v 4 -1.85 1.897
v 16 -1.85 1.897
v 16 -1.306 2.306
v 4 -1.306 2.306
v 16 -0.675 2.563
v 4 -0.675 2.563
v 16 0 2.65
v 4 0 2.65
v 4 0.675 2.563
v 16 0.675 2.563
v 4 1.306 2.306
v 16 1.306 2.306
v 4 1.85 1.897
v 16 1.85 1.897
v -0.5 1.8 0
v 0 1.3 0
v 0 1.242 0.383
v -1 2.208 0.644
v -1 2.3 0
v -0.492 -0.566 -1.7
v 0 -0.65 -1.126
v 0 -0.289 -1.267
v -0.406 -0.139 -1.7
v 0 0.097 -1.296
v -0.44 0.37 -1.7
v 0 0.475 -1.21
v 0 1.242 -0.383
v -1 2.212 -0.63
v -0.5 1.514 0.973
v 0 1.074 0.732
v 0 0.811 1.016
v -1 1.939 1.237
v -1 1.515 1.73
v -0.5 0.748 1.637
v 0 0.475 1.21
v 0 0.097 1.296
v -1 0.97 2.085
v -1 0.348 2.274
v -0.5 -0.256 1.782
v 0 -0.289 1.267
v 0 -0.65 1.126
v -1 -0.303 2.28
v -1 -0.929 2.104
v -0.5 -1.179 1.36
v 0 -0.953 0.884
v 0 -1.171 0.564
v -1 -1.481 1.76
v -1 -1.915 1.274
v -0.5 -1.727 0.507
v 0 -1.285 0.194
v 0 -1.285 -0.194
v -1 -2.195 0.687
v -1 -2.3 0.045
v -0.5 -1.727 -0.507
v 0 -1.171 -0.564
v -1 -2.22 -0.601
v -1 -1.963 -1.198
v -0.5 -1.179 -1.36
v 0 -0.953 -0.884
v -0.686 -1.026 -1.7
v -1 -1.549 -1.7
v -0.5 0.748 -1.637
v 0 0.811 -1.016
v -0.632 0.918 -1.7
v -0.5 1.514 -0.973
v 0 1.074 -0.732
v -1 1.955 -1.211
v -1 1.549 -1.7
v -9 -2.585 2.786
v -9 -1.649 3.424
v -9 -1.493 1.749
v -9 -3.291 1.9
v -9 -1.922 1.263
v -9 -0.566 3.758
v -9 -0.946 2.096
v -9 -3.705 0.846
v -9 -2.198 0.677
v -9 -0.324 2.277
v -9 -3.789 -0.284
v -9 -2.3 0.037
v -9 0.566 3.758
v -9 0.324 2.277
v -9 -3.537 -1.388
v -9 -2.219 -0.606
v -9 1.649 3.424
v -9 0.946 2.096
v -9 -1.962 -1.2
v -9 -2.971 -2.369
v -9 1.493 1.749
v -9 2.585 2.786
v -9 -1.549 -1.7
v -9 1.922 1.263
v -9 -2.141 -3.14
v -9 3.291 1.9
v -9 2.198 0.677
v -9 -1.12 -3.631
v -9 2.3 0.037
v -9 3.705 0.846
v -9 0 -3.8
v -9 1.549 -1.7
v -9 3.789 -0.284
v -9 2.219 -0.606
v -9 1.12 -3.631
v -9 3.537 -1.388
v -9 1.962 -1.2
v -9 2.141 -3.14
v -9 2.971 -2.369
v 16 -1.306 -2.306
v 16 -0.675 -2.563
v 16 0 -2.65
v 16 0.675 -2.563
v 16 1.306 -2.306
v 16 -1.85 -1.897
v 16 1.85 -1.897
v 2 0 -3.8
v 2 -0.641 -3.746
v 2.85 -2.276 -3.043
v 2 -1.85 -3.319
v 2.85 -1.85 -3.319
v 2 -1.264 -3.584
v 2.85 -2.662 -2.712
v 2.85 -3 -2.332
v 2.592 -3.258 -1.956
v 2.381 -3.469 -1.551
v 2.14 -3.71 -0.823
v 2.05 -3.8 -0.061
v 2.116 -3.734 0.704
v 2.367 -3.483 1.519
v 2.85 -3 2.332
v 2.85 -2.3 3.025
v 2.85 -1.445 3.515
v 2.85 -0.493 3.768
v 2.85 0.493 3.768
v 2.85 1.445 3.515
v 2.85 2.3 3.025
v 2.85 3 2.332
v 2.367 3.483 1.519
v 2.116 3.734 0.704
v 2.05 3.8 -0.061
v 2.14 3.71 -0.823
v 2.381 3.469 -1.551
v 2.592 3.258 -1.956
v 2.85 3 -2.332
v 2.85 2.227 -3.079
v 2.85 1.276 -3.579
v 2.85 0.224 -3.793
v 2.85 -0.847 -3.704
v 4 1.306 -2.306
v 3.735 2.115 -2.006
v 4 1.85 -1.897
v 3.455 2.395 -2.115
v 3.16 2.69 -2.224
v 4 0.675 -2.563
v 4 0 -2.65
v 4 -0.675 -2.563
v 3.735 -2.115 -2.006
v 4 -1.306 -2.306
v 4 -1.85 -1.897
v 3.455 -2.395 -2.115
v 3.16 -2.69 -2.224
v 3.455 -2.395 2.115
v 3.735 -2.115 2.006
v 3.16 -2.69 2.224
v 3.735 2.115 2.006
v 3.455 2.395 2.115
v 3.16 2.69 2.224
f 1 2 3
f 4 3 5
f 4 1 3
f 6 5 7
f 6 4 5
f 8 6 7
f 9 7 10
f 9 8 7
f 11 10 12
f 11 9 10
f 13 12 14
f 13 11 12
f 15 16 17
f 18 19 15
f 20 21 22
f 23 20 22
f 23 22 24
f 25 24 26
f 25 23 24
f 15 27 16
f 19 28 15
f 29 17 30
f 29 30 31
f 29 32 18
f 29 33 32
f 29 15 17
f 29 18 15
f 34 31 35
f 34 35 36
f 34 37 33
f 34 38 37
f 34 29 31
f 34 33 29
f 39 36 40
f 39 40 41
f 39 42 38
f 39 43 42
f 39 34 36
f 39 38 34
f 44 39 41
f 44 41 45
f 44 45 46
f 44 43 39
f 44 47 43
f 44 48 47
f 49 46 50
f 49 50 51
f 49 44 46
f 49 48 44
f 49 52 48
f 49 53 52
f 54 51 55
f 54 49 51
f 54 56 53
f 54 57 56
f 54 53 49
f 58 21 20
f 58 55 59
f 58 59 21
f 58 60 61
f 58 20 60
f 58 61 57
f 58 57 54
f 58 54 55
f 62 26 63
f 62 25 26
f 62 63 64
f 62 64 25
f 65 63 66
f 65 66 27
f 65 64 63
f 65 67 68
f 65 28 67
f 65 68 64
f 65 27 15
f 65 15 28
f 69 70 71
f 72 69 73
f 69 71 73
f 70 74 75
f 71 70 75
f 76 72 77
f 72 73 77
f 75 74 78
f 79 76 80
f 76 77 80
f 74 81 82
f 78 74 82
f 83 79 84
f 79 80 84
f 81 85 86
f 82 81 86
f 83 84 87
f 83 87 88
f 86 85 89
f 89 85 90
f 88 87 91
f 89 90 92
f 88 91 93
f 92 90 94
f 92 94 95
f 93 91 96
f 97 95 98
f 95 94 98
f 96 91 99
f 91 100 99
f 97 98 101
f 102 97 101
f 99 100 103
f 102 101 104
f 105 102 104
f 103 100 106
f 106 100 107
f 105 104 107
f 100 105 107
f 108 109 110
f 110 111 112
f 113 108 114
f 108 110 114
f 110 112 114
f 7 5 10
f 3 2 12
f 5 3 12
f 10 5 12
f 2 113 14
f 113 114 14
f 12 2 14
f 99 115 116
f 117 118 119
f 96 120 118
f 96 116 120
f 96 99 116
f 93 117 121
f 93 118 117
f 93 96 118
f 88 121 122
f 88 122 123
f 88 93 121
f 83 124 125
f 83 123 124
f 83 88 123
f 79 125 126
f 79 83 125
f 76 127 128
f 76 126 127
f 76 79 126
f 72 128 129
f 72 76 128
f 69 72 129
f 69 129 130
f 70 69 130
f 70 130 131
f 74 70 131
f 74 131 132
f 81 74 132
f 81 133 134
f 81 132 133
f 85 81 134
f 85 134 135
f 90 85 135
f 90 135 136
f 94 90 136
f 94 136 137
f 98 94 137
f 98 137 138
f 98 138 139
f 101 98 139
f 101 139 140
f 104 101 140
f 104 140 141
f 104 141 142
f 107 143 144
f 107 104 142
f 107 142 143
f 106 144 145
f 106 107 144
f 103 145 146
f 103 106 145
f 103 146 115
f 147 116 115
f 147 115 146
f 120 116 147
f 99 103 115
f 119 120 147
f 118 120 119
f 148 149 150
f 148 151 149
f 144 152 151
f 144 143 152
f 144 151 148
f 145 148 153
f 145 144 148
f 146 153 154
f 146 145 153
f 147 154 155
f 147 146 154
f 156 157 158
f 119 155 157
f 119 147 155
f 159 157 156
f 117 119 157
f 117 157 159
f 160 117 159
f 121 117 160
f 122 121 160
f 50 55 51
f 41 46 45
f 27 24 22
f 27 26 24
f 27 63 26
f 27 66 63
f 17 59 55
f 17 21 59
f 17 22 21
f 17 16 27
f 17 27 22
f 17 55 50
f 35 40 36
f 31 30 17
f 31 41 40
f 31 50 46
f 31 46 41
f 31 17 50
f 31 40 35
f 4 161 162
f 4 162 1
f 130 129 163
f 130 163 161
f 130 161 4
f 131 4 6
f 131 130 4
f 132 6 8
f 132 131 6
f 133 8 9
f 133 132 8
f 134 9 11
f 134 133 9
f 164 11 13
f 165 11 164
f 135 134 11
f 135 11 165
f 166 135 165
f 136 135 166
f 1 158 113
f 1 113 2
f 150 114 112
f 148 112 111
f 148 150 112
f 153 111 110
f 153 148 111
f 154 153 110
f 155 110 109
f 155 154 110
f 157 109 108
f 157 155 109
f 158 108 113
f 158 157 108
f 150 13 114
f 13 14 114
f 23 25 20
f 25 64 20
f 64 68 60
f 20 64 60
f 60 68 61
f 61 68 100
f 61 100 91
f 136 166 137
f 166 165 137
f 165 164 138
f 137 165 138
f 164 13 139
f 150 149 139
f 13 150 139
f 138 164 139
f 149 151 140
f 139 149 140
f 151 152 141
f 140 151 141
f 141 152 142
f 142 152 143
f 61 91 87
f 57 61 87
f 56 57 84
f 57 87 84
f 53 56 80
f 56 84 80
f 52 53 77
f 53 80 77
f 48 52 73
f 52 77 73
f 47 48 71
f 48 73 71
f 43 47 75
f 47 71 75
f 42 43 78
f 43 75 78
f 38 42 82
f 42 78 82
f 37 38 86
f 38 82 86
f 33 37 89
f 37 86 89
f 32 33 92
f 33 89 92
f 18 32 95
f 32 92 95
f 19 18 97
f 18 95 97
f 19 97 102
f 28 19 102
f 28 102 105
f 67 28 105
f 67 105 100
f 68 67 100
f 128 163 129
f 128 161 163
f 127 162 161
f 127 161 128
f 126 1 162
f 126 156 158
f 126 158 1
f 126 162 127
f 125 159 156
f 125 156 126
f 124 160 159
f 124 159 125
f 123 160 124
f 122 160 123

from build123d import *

# Parameters (mm, degrees)
SALIENTE_EXTRUIR1_DEPTH      = 16
SALIENTE_EXTRUIR2_DEPTH      = 2
SALIENTE_EXTRUIR2_DEPTH_BACK = 9
CROQUIS2_R                   = 3.8
SALIENTE_EXTRUIR3_DEPTH      = 2
CHAFL_N1_SIZE                = 2


with BuildPart() as part:
    # Croquis1 → Saliente-Extruir1 (new body)
    with BuildSketch(Plane(origin=(0, 0, 0), x_dir=(0, 0, -1), z_dir=(1, 0, 0))):
        with BuildLine():
            Line((-1.897366596, 1.85), (1.897366596, 1.85))
            ThreePointArc((1.897366596, 1.85), (2.65, 0), (1.897366596, -1.85))
            Line((1.897366596, -1.85), (-1.897366596, -1.85))
            ThreePointArc((-1.897366596, -1.85), (-2.65, 0), (-1.897366596, 1.85))
        make_face()
    extrude(amount=SALIENTE_EXTRUIR1_DEPTH)

    # Croquis2 → Saliente-Extruir2 (add, two sides: drawn at the far end of the back side and taken through both)
    with BuildSketch(Plane(origin=(0, 0, 0), x_dir=(0, 0, -1), z_dir=(1, 0, 0)).offset(-SALIENTE_EXTRUIR2_DEPTH_BACK)):
        Circle(CROQUIS2_R)
        with BuildLine():
            Line((1.7, 1.549193338), (1.7, -1.549193338))
            ThreePointArc((1.7, -1.549193338), (-2.3, 0), (1.7, 1.549193338))
        make_face(mode=Mode.SUBTRACT)
    extrude(amount=SALIENTE_EXTRUIR2_DEPTH + SALIENTE_EXTRUIR2_DEPTH_BACK)

    # Croquis3 → Saliente-Extruir3 (add)
    with BuildSketch(Plane(origin=(0, 0, 0), x_dir=(0, 0, -1), z_dir=(1, 0, 0))):
        with BuildLine():
            Line((-1.897366596, 1.85), (1.897366596, 1.85))
            ThreePointArc((1.897366596, 1.85), (0, 2.65), (-1.897366596, 1.85))
        make_face()
        with BuildLine():
            Line((-1.897366596, -1.85), (1.897366596, -1.85))
            ThreePointArc((1.897366596, -1.85), (0, -2.65), (-1.897366596, -1.85))
        make_face()
    extrude(amount=SALIENTE_EXTRUIR3_DEPTH)

    # Chaflán1
    # the kernel refuses this chamfer: 2 mm, written as the material it adds along each edge
    with BuildSketch(Plane(origin=(2, 0, 0), x_dir=(0, 0.4143114997605186, 0.91013514445174), z_dir=(0, -0.91013514445174, 0.4143114997605186))) as chafl_n1_piece_1_section:
        Polygon((2.65, -CHAFL_N1_SIZE), (2.65 + CHAFL_N1_SIZE, 0), (2.65, 0), align=None)
    chafl_n1_piece_1 = revolve(axis=Axis((2, 0, 0), (-1, 0, 0)), revolution_arc=311.048068347, mode=Mode.PRIVATE)
    chafl_n1_piece_1 = split(chafl_n1_piece_1, bisect_by=Plane(origin=(2, 1.85, 0), z_dir=(0, -1, 0)), keep=Keep.TOP, mode=Mode.PRIVATE)
    chafl_n1_piece_1 = split(chafl_n1_piece_1, bisect_by=Plane(origin=(2, -1.85, 0), z_dir=(0, 1, 0)), keep=Keep.TOP, mode=Mode.PRIVATE)
    chafl_n1_piece_1 = chafl_n1_piece_1 & Plane(origin=(2, 0, 0), x_dir=(0, 0, -1), z_dir=(-1, 0, 0)) * Cylinder(3.8, 19, mode=Mode.PRIVATE)
    add(chafl_n1_piece_1)
    with BuildSketch(Plane(origin=(2, -1.85, -7.040732572), x_dir=(1, 0, 0), z_dir=(0, 0, 1))) as chafl_n1_piece_2_section:
        Polygon((CHAFL_N1_SIZE, 0), (0, -CHAFL_N1_SIZE), (0, 0), align=None)
    chafl_n1_piece_2 = extrude(amount=14.081465144, mode=Mode.PRIVATE)
    chafl_n1_piece_2 = chafl_n1_piece_2 & Plane(origin=(2, 0, 0), x_dir=(0, 0.6981132075471701, -0.7159873947551046), z_dir=(-1, 0, 0)) * Cylinder(2.65, 37, mode=Mode.PRIVATE)
    add(chafl_n1_piece_2)
    with BuildSketch(Plane(origin=(2, 0, 0), x_dir=(0, -0.4143114997605186, -0.91013514445174), z_dir=(0, 0.91013514445174, -0.4143114997605186))) as chafl_n1_piece_3_section:
        Polygon((2.65, -CHAFL_N1_SIZE), (2.65 + CHAFL_N1_SIZE, 0), (2.65, 0), align=None)
    chafl_n1_piece_3 = revolve(axis=Axis((2, 0, 0), (-1, 0, 0)), revolution_arc=311.048068347, mode=Mode.PRIVATE)
    chafl_n1_piece_3 = split(chafl_n1_piece_3, bisect_by=Plane(origin=(2, 1.85, 0), z_dir=(0, -1, 0)), keep=Keep.TOP, mode=Mode.PRIVATE)
    chafl_n1_piece_3 = split(chafl_n1_piece_3, bisect_by=Plane(origin=(2, -1.85, 0), z_dir=(0, 1, 0)), keep=Keep.TOP, mode=Mode.PRIVATE)
    chafl_n1_piece_3 = chafl_n1_piece_3 & Plane(origin=(2, 0, 0), x_dir=(0, 0, -1), z_dir=(-1, 0, 0)) * Cylinder(3.8, 19, mode=Mode.PRIVATE)
    add(chafl_n1_piece_3)
    with BuildSketch(Plane(origin=(2, 1.85, -7.040732572), x_dir=(1, 0, 0), z_dir=(0, 0, 1))) as chafl_n1_piece_4_section:
        Polygon((CHAFL_N1_SIZE, 0), (0, CHAFL_N1_SIZE), (0, 0), align=None)
    chafl_n1_piece_4 = extrude(amount=14.081465144, mode=Mode.PRIVATE)
    chafl_n1_piece_4 = chafl_n1_piece_4 & Plane(origin=(2, 0, 0), x_dir=(0, -0.6981132075471701, 0.7159873947551046), z_dir=(-1, 0, 0)) * Cylinder(2.65, 37, mode=Mode.PRIVATE)
    add(chafl_n1_piece_4)
    with BuildSketch(Plane(origin=(2, 1.85, -7.040732572), x_dir=(1, 0, 0), z_dir=(0, 0, 1))) as chafl_n1_piece_5a_section:
        Polygon((CHAFL_N1_SIZE, 0), (0, CHAFL_N1_SIZE), (0, 0), align=None)
    chafl_n1_piece_5a = extrude(amount=14.081465144, mode=Mode.PRIVATE)
    chafl_n1_piece_5a = chafl_n1_piece_5a - Plane(origin=(2, 0, 0), x_dir=(0, -0.6981132075471701, 0.7159873947551046), z_dir=(-1, 0, 0)) * Cylinder(2.65, 37, mode=Mode.PRIVATE)
    chafl_n1_piece_5a = chafl_n1_piece_5a & Plane(origin=(2, 0, 0), x_dir=(0, 0, -1), z_dir=(-1, 0, 0)) * Cylinder(3.8, 37, mode=Mode.PRIVATE)
    with BuildSketch(Plane(origin=(2, 0, 0), x_dir=(0, 0.4143114997605186, 0.91013514445174), z_dir=(0, -0.91013514445174, 0.4143114997605186))) as chafl_n1_piece_5b_section:
        Polygon((2.65, -CHAFL_N1_SIZE), (2.65 + CHAFL_N1_SIZE, 0), (2.65, 0), align=None)
    chafl_n1_piece_5b = revolve(axis=Axis((2, 0, 0), (-1, 0, 0)), revolution_arc=311.048068347, mode=Mode.PRIVATE)
    chafl_n1_piece_5b = split(chafl_n1_piece_5b, bisect_by=Plane(origin=(2, 1.85, 0), z_dir=(0, 1, 0)), keep=Keep.TOP, mode=Mode.PRIVATE)
    chafl_n1_piece_5b = chafl_n1_piece_5b & Plane(origin=(2, 0, 0), x_dir=(0, 0, -1), z_dir=(-1, 0, 0)) * Cylinder(3.8, 19, mode=Mode.PRIVATE)
    chafl_n1_piece_5 = chafl_n1_piece_5a & chafl_n1_piece_5b
    add(chafl_n1_piece_5)
    with BuildSketch(Plane(origin=(2, 0, 0), x_dir=(0, 0.4143114997605186, 0.91013514445174), z_dir=(0, -0.91013514445174, 0.4143114997605186))) as chafl_n1_piece_6a_section:
        Polygon((2.65, -CHAFL_N1_SIZE), (2.65 + CHAFL_N1_SIZE, 0), (2.65, 0), align=None)
    chafl_n1_piece_6a = revolve(axis=Axis((2, 0, 0), (-1, 0, 0)), revolution_arc=311.048068347, mode=Mode.PRIVATE)
    chafl_n1_piece_6a = split(chafl_n1_piece_6a, bisect_by=Plane(origin=(2, -1.85, 0), z_dir=(0, -1, 0)), keep=Keep.TOP, mode=Mode.PRIVATE)
    chafl_n1_piece_6a = chafl_n1_piece_6a & Plane(origin=(2, 0, 0), x_dir=(0, 0, -1), z_dir=(-1, 0, 0)) * Cylinder(3.8, 19, mode=Mode.PRIVATE)
    with BuildSketch(Plane(origin=(2, -1.85, -7.040732572), x_dir=(1, 0, 0), z_dir=(0, 0, 1))) as chafl_n1_piece_6b_section:
        Polygon((CHAFL_N1_SIZE, 0), (0, -CHAFL_N1_SIZE), (0, 0), align=None)
    chafl_n1_piece_6b = extrude(amount=14.081465144, mode=Mode.PRIVATE)
    chafl_n1_piece_6b = chafl_n1_piece_6b - Plane(origin=(2, 0, 0), x_dir=(0, 0.6981132075471701, -0.7159873947551046), z_dir=(-1, 0, 0)) * Cylinder(2.65, 37, mode=Mode.PRIVATE)
    chafl_n1_piece_6b = chafl_n1_piece_6b & Plane(origin=(2, 0, 0), x_dir=(0, 0, -1), z_dir=(-1, 0, 0)) * Cylinder(3.8, 37, mode=Mode.PRIVATE)
    chafl_n1_piece_6 = chafl_n1_piece_6a & chafl_n1_piece_6b
    add(chafl_n1_piece_6)
    with BuildSketch(Plane(origin=(2, -1.85, -7.040732572), x_dir=(1, 0, 0), z_dir=(0, 0, 1))) as chafl_n1_piece_7a_section:
        Polygon((CHAFL_N1_SIZE, 0), (0, -CHAFL_N1_SIZE), (0, 0), align=None)
    chafl_n1_piece_7a = extrude(amount=14.081465144, mode=Mode.PRIVATE)
    chafl_n1_piece_7a = chafl_n1_piece_7a - Plane(origin=(2, 0, 0), x_dir=(0, 0.6981132075471701, -0.7159873947551046), z_dir=(-1, 0, 0)) * Cylinder(2.65, 37, mode=Mode.PRIVATE)
    chafl_n1_piece_7a = chafl_n1_piece_7a & Plane(origin=(2, 0, 0), x_dir=(0, 0, -1), z_dir=(-1, 0, 0)) * Cylinder(3.8, 37, mode=Mode.PRIVATE)
    with BuildSketch(Plane(origin=(2, 0, 0), x_dir=(0, -0.4143114997605186, -0.91013514445174), z_dir=(0, 0.91013514445174, -0.4143114997605186))) as chafl_n1_piece_7b_section:
        Polygon((2.65, -CHAFL_N1_SIZE), (2.65 + CHAFL_N1_SIZE, 0), (2.65, 0), align=None)
    chafl_n1_piece_7b = revolve(axis=Axis((2, 0, 0), (-1, 0, 0)), revolution_arc=311.048068347, mode=Mode.PRIVATE)
    chafl_n1_piece_7b = split(chafl_n1_piece_7b, bisect_by=Plane(origin=(2, -1.85, 0), z_dir=(0, -1, 0)), keep=Keep.TOP, mode=Mode.PRIVATE)
    chafl_n1_piece_7b = chafl_n1_piece_7b & Plane(origin=(2, 0, 0), x_dir=(0, 0, -1), z_dir=(-1, 0, 0)) * Cylinder(3.8, 19, mode=Mode.PRIVATE)
    chafl_n1_piece_7 = chafl_n1_piece_7a & chafl_n1_piece_7b
    add(chafl_n1_piece_7)
    with BuildSketch(Plane(origin=(2, 1.85, -7.040732572), x_dir=(1, 0, 0), z_dir=(0, 0, 1))) as chafl_n1_piece_8a_section:
        Polygon((CHAFL_N1_SIZE, 0), (0, CHAFL_N1_SIZE), (0, 0), align=None)
    chafl_n1_piece_8a = extrude(amount=14.081465144, mode=Mode.PRIVATE)
    chafl_n1_piece_8a = chafl_n1_piece_8a - Plane(origin=(2, 0, 0), x_dir=(0, -0.6981132075471701, 0.7159873947551046), z_dir=(-1, 0, 0)) * Cylinder(2.65, 37, mode=Mode.PRIVATE)
    chafl_n1_piece_8a = chafl_n1_piece_8a & Plane(origin=(2, 0, 0), x_dir=(0, 0, -1), z_dir=(-1, 0, 0)) * Cylinder(3.8, 37, mode=Mode.PRIVATE)
    with BuildSketch(Plane(origin=(2, 0, 0), x_dir=(0, -0.4143114997605186, -0.91013514445174), z_dir=(0, 0.91013514445174, -0.4143114997605186))) as chafl_n1_piece_8b_section:
        Polygon((2.65, -CHAFL_N1_SIZE), (2.65 + CHAFL_N1_SIZE, 0), (2.65, 0), align=None)
    chafl_n1_piece_8b = revolve(axis=Axis((2, 0, 0), (-1, 0, 0)), revolution_arc=311.048068347, mode=Mode.PRIVATE)
    chafl_n1_piece_8b = split(chafl_n1_piece_8b, bisect_by=Plane(origin=(2, 1.85, 0), z_dir=(0, 1, 0)), keep=Keep.TOP, mode=Mode.PRIVATE)
    chafl_n1_piece_8b = chafl_n1_piece_8b & Plane(origin=(2, 0, 0), x_dir=(0, 0, -1), z_dir=(-1, 0, 0)) * Cylinder(3.8, 19, mode=Mode.PRIVATE)
    chafl_n1_piece_8 = chafl_n1_piece_8a & chafl_n1_piece_8b
    add(chafl_n1_piece_8)

    # Chaflán2: read off the stored shape, not the designer's step
    # Chaflán2 outline → Chaflán2 (revolve)
    with BuildSketch(Plane.YX):
        Polygon((2.3, 0), (1.3, 0), (2.3, -1), align=None)
    revolve(axis=Axis((0, 0, 0), (1, 0, 0)))


solid = part.part
